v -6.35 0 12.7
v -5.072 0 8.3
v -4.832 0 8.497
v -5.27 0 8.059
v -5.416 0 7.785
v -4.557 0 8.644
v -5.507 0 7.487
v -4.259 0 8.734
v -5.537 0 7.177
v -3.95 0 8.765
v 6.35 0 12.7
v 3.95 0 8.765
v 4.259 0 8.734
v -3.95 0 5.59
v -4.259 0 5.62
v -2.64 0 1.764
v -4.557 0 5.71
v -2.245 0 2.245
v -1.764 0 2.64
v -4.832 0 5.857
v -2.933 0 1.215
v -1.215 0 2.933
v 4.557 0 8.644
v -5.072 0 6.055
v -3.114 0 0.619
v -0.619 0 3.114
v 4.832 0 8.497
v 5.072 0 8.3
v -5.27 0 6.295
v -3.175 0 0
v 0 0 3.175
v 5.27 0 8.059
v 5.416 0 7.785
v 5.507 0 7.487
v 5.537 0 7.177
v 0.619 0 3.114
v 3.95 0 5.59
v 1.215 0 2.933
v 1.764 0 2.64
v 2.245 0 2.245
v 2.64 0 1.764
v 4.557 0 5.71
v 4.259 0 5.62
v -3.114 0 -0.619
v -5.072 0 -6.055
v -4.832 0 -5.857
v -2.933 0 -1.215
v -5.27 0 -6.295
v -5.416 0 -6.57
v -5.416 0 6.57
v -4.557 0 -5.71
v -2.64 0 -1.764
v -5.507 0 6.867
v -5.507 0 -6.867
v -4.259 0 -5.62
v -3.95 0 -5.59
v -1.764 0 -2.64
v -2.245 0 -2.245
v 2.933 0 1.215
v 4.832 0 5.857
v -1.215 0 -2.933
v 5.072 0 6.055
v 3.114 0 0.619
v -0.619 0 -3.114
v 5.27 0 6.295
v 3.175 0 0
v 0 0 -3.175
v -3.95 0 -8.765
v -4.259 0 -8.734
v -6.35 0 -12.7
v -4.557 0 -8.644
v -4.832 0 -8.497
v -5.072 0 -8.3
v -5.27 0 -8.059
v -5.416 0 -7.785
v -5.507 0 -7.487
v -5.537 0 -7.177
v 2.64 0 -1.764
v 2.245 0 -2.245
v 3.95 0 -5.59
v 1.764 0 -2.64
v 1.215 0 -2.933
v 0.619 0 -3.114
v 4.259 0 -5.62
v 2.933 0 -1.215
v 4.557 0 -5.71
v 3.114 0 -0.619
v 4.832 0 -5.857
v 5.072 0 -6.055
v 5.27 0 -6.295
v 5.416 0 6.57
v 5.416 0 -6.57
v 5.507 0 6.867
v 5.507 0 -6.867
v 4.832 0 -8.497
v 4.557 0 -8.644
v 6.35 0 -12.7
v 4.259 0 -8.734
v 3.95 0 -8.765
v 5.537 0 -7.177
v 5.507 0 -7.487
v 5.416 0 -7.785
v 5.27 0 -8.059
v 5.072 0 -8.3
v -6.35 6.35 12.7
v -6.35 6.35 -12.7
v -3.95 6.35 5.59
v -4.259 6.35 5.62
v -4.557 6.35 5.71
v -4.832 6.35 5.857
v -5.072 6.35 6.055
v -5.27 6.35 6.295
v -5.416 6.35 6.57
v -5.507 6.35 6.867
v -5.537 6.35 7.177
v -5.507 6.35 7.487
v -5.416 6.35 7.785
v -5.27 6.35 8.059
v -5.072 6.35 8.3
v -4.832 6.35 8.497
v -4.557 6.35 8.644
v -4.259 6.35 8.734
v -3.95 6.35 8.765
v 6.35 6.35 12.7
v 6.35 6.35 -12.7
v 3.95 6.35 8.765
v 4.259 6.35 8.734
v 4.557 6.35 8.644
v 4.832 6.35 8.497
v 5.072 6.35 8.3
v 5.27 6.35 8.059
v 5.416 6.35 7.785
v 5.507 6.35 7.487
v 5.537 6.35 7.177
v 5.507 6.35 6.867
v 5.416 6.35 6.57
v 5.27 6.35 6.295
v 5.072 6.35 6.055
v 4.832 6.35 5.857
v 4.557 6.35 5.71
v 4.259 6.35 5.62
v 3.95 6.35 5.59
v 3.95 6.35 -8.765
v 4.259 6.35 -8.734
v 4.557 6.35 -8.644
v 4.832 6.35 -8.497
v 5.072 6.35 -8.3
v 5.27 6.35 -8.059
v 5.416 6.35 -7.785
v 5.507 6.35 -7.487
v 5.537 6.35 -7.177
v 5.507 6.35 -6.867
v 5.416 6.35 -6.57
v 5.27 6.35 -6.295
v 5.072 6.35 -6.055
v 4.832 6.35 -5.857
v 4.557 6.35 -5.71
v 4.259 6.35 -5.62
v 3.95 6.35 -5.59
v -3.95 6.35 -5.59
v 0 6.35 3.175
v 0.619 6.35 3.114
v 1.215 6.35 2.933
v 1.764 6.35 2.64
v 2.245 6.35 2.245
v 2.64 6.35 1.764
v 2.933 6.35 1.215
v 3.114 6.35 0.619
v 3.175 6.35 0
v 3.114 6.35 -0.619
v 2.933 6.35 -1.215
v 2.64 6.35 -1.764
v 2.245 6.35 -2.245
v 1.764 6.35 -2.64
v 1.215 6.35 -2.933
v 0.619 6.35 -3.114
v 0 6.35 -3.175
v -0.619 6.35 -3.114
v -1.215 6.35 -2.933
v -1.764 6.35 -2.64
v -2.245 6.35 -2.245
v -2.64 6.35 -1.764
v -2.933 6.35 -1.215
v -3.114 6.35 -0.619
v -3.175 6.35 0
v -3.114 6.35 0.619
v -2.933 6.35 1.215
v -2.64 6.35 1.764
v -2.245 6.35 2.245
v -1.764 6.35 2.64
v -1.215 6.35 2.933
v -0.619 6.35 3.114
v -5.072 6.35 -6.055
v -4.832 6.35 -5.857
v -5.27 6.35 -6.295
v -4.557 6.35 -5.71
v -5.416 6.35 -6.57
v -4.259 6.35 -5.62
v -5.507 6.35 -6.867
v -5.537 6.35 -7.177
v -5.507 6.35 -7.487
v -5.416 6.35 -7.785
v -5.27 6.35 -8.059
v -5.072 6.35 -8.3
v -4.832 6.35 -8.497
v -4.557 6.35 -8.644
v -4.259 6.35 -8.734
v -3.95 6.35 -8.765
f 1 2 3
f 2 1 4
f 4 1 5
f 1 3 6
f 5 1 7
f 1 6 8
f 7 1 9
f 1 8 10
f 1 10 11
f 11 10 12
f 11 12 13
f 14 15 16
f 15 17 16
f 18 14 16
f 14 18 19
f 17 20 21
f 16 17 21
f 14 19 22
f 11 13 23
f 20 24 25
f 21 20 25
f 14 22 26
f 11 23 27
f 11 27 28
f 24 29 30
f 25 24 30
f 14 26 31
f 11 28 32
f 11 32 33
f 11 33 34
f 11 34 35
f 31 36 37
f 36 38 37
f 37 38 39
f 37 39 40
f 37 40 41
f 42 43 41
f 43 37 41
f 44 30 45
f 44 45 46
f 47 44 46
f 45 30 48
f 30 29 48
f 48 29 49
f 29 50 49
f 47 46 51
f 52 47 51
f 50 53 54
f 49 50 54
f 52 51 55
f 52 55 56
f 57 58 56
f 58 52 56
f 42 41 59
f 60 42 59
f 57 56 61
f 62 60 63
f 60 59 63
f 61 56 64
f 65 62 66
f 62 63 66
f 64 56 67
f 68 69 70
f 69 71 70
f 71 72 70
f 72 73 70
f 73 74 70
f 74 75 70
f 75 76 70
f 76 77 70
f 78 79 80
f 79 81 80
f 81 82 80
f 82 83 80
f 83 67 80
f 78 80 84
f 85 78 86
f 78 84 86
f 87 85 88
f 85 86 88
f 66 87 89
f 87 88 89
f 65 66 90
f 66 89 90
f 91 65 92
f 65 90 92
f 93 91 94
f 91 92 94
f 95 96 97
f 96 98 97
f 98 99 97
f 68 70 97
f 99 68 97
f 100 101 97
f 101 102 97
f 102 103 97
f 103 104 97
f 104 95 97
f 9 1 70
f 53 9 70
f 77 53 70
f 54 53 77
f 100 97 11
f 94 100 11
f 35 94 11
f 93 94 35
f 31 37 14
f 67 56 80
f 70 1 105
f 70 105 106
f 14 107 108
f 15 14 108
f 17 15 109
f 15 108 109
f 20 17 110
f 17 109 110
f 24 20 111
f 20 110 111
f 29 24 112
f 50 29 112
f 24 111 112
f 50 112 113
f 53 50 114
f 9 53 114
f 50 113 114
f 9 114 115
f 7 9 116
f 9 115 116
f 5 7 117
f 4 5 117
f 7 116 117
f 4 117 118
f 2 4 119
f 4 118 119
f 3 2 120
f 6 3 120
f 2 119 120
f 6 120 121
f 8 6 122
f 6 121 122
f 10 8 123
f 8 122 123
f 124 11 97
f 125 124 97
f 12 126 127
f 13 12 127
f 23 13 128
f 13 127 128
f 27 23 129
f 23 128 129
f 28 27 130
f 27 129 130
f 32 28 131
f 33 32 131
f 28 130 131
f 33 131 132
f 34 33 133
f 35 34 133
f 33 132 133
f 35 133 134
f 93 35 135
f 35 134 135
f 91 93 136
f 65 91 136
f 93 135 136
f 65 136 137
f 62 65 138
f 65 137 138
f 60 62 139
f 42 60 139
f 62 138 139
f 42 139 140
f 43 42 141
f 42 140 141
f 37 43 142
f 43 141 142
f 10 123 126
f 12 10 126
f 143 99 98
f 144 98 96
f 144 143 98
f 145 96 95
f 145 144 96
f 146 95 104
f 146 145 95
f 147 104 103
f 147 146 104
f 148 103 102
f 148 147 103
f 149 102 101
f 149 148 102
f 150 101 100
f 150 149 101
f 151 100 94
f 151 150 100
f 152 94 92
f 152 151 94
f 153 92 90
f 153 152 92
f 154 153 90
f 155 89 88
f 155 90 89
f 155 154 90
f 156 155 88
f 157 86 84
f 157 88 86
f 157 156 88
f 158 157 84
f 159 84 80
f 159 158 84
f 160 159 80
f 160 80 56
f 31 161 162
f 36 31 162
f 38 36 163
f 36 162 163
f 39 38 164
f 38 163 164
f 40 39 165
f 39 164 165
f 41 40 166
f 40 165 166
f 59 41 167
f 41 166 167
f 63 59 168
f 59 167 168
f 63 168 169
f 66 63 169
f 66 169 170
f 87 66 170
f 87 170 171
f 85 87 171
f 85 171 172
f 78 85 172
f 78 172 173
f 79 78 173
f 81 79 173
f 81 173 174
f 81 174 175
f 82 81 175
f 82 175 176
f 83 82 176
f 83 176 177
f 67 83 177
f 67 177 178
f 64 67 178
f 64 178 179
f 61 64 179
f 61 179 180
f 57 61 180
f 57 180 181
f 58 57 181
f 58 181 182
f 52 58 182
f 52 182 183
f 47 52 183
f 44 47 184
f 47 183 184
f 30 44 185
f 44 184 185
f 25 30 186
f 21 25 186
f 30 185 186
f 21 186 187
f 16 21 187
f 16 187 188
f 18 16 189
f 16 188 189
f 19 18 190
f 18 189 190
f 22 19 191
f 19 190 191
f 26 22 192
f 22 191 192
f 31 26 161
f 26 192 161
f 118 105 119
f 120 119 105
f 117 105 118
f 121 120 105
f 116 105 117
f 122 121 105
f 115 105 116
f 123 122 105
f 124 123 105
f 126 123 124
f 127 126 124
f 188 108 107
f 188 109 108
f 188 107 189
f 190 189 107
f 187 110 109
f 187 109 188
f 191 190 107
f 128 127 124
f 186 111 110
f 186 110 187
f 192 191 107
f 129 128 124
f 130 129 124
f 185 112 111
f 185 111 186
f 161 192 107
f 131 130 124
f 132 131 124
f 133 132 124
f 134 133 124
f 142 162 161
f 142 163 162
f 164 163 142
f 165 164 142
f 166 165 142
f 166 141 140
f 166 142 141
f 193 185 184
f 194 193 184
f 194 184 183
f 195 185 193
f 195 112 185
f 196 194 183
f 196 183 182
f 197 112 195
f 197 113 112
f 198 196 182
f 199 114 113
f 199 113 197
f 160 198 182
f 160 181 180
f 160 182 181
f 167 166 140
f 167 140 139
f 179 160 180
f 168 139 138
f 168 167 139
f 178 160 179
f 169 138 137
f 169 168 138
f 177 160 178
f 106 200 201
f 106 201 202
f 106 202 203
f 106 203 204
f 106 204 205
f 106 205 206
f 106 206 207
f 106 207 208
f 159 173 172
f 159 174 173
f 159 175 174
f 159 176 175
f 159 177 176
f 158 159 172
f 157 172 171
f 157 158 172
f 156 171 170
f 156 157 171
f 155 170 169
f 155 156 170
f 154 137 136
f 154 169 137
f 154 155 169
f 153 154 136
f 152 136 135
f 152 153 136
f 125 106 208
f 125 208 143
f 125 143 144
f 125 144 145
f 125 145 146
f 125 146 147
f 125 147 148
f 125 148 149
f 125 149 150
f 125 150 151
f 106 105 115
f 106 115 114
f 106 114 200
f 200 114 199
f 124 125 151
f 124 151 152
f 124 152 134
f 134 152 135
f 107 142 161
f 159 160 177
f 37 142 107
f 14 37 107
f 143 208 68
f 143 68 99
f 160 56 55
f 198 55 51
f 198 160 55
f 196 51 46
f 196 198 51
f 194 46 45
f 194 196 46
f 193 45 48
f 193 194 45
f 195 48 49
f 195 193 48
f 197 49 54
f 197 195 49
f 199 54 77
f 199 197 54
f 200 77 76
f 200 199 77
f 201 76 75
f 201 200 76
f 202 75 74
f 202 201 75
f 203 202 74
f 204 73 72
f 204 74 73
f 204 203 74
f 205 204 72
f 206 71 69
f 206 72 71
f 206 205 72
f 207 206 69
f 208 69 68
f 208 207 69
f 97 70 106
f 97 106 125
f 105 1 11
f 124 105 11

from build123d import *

# Parameters (mm, degrees)
SKETCH1_W           = 12.7
SKETCH1_H           = 25.4
BOSS_EXTRUDE1_DEPTH = 6.35
SKETCH2_R           = 3.175
CUT_EXTRUDE1_DEPTH  = 16.554259867
CUT_EXTRUDE2_DEPTH  = 16.554259867


with BuildPart() as part:
    # Sketch1 → Boss-Extrude1 (new body)
    with BuildSketch(Plane(origin=(0, 0, 0), x_dir=(1, 0, 0), z_dir=(0, 1, 0))):
        Rectangle(SKETCH1_W, SKETCH1_H)
    extrude(amount=BOSS_EXTRUDE1_DEPTH)

    # Sketch2 → Cut-Extrude1 (cut, through all)
    with BuildSketch(Plane(origin=(0, 6.35, 0), x_dir=(1, 0, 0), z_dir=(0, 1, 0))):
        with Locations(Location((0, 0, 0), (0, 0, 270))):
            Circle(SKETCH2_R)
    extrude(amount=-CUT_EXTRUDE1_DEPTH, mode=Mode.SUBTRACT)

    # Sketch3 → Cut-Extrude2 (cut, through all)
    with BuildSketch(Plane(origin=(0, 6.35, 0), x_dir=(1, 0, 0), z_dir=(0, 1, 0))):
        with BuildLine():
            Line((-3.949618405, 8.764602641), (3.949618405, 8.764602641))
            ThreePointArc((3.949618405, 8.764602641), (5.537118405, 7.177102641), (3.949618405, 5.589602641))
            Line((3.949618405, 5.589602641), (-3.949618405, 5.589602641))
            ThreePointArc((-3.949618405, 5.589602641), (-5.537118405, 7.177102641), (-3.949618405, 8.764602641))
        make_face()
    cut_extrude2 = extrude(amount=-CUT_EXTRUDE2_DEPTH, mode=Mode.SUBTRACT)

    # Mirror1: Cut-Extrude2 across plane
    add(cut_extrude2.mirror(Plane.XY), mode=Mode.SUBTRACT)


solid = part.part
